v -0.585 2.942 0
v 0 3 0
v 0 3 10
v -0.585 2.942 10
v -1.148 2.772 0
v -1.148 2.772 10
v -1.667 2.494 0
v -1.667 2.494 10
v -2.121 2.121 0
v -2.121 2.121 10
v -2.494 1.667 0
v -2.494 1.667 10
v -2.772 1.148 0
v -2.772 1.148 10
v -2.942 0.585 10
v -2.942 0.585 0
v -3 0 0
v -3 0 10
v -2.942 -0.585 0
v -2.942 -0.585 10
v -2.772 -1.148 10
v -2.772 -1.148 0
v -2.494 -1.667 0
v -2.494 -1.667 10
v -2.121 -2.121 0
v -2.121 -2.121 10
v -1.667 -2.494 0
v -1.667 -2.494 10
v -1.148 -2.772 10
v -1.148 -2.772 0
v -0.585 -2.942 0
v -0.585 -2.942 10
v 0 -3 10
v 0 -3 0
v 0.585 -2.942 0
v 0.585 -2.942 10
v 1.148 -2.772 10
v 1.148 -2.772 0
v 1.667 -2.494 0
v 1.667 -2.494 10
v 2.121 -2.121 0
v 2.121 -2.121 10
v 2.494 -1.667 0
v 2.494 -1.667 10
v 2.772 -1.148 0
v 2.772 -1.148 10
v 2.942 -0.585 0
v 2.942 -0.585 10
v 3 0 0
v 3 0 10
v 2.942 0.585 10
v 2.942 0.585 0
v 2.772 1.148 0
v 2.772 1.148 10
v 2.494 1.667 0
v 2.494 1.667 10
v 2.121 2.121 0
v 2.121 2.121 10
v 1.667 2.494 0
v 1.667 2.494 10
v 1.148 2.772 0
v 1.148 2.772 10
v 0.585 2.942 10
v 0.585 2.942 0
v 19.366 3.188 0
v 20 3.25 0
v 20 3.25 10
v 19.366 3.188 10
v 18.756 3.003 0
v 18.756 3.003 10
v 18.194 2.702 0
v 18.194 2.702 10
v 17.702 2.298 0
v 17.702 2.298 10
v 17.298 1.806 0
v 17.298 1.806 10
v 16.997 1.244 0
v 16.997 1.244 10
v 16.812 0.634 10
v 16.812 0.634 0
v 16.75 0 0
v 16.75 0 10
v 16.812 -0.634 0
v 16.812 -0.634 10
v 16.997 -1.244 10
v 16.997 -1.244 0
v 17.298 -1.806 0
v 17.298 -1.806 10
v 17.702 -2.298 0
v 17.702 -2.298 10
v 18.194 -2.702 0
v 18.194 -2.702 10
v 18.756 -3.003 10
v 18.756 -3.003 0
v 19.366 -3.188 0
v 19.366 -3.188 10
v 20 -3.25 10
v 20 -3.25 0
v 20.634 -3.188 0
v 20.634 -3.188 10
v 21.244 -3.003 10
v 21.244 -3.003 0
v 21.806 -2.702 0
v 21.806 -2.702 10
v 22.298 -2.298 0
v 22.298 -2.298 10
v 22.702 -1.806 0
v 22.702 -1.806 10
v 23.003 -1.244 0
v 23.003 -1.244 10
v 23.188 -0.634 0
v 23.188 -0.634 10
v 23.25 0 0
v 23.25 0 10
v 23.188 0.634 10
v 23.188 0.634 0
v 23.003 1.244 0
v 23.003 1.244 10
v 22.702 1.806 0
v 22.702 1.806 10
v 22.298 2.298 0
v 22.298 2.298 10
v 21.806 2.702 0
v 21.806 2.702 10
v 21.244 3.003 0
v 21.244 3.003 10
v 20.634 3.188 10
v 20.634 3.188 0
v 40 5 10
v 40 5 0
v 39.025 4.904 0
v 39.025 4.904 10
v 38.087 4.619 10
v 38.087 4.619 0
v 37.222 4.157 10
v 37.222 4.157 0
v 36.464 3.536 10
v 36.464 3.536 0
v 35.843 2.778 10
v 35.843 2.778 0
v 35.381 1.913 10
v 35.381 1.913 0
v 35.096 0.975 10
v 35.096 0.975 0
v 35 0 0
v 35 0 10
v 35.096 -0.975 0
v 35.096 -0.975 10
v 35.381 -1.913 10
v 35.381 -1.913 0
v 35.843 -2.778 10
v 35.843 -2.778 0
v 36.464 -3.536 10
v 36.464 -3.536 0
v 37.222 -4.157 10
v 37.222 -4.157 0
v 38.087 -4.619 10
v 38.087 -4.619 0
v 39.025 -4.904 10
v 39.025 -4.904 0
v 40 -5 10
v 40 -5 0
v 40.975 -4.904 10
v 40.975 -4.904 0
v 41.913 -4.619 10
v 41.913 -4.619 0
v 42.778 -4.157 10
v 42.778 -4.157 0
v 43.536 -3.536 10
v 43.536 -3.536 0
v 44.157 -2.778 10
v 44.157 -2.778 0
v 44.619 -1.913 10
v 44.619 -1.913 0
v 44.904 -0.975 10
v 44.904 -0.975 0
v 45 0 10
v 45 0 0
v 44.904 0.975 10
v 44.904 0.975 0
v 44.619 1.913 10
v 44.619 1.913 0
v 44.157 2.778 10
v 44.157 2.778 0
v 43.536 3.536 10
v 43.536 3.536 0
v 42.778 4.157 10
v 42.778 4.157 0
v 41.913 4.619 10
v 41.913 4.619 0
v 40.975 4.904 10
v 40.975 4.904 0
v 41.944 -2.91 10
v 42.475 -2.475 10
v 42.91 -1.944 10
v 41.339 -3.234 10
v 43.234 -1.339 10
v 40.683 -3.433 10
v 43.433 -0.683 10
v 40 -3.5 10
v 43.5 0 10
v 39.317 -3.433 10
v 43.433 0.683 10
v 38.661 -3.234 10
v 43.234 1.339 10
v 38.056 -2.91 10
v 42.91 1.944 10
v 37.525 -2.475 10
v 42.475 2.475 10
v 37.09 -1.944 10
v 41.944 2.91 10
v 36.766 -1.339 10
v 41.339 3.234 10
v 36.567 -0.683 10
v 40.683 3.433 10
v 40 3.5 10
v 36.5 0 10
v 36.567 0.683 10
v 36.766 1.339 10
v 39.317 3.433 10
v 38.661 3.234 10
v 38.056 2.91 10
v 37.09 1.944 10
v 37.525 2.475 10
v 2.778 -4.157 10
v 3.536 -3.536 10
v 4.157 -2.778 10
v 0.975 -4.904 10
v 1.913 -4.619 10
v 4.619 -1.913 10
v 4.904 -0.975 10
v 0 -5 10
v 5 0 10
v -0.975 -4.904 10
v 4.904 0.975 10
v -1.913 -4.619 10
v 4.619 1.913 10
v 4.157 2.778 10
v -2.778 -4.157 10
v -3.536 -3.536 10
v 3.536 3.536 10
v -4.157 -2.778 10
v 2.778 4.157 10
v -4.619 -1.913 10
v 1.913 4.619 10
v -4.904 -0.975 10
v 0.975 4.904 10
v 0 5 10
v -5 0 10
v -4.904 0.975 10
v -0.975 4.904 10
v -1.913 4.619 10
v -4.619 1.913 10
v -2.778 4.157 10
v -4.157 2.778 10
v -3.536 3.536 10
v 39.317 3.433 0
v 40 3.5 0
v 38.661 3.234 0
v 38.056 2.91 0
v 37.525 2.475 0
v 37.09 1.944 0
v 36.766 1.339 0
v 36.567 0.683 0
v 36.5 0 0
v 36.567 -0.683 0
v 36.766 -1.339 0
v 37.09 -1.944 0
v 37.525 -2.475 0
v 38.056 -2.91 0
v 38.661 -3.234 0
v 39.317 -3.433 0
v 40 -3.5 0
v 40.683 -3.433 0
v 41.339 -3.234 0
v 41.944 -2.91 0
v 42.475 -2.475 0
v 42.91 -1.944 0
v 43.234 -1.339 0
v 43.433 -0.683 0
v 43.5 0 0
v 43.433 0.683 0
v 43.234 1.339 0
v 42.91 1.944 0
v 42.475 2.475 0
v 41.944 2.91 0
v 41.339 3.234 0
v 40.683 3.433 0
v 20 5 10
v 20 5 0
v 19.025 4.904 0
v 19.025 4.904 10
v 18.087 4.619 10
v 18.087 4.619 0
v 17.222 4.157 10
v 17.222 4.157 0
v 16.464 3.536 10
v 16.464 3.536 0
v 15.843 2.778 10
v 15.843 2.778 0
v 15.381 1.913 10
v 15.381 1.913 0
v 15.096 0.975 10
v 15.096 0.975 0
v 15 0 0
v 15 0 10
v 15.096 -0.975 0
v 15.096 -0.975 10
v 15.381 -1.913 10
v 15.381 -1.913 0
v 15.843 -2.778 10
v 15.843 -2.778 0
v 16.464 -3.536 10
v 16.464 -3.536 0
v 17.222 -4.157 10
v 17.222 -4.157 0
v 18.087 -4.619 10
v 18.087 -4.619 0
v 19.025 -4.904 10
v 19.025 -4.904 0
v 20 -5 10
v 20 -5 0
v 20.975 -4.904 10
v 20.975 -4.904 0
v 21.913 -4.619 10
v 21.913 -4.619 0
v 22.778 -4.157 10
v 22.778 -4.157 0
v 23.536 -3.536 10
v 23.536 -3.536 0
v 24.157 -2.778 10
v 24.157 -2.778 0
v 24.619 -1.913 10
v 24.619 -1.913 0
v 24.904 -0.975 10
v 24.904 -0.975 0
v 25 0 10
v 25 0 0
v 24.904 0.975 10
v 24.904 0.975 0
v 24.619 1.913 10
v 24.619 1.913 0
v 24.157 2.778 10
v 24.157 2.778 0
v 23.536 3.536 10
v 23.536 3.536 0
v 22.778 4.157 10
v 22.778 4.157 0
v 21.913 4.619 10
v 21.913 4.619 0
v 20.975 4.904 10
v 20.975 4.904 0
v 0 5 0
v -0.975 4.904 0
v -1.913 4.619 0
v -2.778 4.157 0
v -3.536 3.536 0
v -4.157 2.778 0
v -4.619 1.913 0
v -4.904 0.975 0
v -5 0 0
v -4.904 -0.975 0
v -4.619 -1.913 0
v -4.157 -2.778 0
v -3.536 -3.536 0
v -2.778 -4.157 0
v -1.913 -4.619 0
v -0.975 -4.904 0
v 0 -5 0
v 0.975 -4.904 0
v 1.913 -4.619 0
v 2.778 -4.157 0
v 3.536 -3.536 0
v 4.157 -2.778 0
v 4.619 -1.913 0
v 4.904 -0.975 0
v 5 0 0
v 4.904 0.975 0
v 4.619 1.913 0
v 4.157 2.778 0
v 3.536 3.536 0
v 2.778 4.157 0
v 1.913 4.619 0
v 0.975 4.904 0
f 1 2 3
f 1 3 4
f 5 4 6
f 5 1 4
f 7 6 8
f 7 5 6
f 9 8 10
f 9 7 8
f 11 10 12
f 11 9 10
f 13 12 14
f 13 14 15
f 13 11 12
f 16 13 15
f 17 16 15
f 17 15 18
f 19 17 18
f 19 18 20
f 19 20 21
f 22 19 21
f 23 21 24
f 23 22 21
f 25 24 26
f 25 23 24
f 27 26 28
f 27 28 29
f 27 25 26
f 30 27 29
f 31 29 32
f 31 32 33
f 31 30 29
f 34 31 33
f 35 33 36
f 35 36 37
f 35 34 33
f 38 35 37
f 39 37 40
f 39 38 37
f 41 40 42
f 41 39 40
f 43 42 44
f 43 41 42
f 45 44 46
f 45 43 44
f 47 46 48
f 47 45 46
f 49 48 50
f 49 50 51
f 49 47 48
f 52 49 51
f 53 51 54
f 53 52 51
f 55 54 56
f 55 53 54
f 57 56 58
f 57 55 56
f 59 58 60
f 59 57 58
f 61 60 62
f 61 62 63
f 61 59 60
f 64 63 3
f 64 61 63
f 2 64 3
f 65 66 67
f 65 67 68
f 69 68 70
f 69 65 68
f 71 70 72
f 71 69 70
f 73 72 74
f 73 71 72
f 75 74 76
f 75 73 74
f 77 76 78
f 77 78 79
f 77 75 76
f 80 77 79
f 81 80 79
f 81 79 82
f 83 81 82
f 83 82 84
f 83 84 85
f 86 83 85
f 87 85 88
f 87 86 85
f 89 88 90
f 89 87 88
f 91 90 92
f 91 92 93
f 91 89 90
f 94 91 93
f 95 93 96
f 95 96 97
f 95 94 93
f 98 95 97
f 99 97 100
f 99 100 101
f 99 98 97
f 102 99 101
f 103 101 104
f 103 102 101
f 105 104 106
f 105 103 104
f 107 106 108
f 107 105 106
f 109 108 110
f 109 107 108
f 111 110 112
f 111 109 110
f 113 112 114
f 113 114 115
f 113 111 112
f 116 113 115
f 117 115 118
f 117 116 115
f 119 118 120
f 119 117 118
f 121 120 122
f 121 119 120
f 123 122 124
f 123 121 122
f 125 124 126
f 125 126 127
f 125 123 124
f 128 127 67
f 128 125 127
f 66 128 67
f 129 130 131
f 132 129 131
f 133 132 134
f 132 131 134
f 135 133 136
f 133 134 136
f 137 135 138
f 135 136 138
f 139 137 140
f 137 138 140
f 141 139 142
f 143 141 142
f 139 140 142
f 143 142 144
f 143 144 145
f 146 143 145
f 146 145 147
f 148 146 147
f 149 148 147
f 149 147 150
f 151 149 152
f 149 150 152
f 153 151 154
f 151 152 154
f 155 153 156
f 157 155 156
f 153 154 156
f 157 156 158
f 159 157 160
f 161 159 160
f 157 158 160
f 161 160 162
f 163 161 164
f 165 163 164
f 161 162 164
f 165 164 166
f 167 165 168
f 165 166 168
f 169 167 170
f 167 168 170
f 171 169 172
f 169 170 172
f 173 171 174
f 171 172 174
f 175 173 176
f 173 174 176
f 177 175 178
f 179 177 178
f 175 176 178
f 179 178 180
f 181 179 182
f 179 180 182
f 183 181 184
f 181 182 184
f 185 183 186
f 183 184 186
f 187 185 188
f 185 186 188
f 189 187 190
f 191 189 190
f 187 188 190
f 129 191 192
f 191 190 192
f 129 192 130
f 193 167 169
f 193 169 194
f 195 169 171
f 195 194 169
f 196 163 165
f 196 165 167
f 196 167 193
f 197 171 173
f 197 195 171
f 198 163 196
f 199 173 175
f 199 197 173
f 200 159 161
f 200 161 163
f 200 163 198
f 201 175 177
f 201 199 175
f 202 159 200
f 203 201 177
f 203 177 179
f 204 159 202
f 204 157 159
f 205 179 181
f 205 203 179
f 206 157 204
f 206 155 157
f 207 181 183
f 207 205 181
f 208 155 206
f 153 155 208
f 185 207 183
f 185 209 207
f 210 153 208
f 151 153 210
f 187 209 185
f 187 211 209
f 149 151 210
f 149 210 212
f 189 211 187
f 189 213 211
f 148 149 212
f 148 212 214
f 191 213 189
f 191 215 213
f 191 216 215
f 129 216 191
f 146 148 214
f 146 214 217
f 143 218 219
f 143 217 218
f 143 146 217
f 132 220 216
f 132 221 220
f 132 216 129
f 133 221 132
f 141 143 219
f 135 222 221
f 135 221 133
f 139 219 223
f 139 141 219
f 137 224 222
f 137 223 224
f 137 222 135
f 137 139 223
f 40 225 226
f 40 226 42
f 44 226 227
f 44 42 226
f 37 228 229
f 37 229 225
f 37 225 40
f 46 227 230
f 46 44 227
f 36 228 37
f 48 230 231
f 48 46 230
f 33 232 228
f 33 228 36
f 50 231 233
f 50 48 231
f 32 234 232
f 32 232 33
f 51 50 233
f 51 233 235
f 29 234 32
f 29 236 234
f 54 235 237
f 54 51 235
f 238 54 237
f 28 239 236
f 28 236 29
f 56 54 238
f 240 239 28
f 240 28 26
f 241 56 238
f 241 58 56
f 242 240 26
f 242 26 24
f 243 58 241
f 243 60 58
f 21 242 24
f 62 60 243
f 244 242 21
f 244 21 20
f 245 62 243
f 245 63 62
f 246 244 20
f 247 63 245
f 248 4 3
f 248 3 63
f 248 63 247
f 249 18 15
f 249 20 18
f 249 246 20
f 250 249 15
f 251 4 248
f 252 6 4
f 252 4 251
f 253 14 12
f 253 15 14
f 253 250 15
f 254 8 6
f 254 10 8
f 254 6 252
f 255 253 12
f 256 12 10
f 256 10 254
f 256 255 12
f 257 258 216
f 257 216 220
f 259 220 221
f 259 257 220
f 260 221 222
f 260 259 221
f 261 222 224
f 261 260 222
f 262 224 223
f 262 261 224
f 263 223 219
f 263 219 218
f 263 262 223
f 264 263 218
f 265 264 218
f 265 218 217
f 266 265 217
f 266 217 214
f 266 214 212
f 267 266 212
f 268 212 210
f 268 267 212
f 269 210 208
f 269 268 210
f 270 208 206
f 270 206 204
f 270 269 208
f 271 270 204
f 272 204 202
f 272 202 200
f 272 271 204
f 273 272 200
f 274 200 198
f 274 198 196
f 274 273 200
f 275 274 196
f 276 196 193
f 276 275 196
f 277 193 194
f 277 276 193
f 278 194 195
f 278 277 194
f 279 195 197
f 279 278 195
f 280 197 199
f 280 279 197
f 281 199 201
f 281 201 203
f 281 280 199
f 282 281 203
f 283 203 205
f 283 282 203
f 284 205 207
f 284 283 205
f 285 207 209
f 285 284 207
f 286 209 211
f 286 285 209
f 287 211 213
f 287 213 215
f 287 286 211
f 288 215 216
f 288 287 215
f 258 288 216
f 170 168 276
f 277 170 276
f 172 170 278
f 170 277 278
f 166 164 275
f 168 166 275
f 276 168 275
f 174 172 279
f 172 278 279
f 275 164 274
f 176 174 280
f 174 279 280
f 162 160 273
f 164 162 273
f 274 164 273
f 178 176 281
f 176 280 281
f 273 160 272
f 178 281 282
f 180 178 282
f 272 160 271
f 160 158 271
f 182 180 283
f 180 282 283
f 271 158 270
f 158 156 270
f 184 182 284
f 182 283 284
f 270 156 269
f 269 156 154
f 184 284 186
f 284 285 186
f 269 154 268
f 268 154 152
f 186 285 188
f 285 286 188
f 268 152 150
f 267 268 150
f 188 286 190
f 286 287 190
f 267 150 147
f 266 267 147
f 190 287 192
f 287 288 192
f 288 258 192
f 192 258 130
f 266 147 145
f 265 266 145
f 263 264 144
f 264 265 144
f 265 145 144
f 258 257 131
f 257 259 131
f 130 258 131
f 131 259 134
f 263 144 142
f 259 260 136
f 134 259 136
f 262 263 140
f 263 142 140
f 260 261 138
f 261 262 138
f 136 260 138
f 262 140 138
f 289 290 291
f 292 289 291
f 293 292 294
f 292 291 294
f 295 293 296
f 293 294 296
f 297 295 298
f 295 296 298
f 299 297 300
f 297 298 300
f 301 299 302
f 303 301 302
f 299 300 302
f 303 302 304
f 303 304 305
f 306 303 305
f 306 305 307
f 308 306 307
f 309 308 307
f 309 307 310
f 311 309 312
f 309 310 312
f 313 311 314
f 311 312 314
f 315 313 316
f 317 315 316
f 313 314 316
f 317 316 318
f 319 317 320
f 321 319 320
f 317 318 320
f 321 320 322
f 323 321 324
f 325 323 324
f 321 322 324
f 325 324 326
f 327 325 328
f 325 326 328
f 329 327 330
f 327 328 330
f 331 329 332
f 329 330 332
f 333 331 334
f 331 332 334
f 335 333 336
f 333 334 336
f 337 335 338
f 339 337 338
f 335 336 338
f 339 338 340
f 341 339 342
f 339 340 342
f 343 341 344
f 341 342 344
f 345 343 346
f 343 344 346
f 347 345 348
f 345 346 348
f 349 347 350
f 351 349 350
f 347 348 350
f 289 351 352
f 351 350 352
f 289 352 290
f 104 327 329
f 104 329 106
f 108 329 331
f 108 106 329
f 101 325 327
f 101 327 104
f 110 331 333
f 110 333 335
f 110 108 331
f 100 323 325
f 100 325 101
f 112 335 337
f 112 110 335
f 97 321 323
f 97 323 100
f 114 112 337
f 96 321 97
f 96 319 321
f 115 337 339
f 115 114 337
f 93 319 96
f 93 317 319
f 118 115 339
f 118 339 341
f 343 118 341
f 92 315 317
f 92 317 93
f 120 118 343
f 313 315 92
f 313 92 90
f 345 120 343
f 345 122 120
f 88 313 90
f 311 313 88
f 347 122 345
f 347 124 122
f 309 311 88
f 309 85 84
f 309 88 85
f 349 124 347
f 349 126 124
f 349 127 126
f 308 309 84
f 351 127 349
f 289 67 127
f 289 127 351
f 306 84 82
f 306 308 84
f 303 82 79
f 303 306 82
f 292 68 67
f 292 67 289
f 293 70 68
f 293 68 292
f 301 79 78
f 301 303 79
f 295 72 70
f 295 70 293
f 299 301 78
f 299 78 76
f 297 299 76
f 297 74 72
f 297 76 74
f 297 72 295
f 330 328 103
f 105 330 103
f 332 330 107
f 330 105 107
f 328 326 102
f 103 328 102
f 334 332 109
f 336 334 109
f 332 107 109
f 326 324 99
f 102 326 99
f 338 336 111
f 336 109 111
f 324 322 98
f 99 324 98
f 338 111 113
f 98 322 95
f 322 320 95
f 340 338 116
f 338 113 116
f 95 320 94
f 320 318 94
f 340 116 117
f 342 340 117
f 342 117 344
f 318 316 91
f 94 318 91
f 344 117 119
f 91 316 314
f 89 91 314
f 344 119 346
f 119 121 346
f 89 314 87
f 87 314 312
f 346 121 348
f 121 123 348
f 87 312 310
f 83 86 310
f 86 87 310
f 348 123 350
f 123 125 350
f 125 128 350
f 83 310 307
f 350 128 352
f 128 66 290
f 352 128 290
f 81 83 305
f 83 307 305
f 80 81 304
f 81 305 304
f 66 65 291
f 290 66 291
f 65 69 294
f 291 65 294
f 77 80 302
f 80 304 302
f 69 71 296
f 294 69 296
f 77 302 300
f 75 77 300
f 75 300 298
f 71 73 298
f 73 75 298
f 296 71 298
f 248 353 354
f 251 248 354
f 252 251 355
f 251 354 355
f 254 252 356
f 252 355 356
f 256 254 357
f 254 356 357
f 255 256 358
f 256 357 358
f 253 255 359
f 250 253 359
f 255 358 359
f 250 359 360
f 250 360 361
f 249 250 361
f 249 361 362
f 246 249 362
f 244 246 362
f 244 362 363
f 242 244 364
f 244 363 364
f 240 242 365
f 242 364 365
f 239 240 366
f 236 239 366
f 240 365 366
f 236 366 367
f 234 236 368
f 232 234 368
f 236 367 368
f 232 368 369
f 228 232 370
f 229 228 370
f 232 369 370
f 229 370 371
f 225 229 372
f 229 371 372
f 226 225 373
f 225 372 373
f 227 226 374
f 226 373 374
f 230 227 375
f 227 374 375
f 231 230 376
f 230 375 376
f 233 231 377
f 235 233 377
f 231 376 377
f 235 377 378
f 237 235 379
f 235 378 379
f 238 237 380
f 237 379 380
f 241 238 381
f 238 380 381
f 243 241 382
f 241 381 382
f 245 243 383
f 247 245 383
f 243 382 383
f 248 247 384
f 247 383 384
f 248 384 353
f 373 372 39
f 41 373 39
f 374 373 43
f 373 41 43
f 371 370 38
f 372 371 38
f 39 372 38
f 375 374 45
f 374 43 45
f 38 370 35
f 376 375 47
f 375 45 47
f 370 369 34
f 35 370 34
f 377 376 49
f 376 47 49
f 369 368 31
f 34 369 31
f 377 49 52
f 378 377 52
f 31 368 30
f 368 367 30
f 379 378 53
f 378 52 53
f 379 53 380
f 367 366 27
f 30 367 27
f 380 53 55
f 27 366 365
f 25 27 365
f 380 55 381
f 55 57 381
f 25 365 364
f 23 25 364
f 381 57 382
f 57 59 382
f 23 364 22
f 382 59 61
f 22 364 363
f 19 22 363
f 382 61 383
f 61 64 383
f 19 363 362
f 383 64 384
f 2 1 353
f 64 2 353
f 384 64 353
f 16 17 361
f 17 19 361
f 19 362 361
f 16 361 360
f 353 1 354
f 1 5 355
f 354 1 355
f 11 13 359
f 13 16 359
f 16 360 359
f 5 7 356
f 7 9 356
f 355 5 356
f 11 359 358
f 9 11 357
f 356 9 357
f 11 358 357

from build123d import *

# Parameters (mm, degrees)
FACE_R           = 5
FACE_R_2         = 3
EXTRUDE_DEPTH    = 10
FACE001_R        = 5
FACE001_R_2      = 3.5
EXTRUDE001_DEPTH = 10
FACE002_R        = 5
FACE002_R_2      = 3.25
EXTRUDE002_DEPTH = 10


with BuildPart() as extrude_body:
    # Face → Extrude (new body)
    with BuildSketch(Plane(origin=(0, 0, 0), x_dir=(0, 1, 0), z_dir=(0, 0, 1))):
        Circle(FACE_R)
        Circle(FACE_R_2, mode=Mode.SUBTRACT)
    extrude(amount=EXTRUDE_DEPTH)


with BuildPart() as extrude001:
    # Face001 → Extrude001 (new body)
    with BuildSketch(Plane(origin=(40, 0, 0), x_dir=(0, 1, 0), z_dir=(0, 0, 1))):
        Circle(FACE001_R)
        Circle(FACE001_R_2, mode=Mode.SUBTRACT)
    extrude(amount=EXTRUDE001_DEPTH)


with BuildPart() as extrude002:
    # Face002 → Extrude002 (new body)
    with BuildSketch(Plane(origin=(20, 0, 0), x_dir=(0, 1, 0), z_dir=(0, 0, 1))):
        Circle(FACE002_R)
        Circle(FACE002_R_2, mode=Mode.SUBTRACT)
    extrude(amount=EXTRUDE002_DEPTH)


solid = Compound([extrude_body.part, extrude001.part, extrude002.part])
